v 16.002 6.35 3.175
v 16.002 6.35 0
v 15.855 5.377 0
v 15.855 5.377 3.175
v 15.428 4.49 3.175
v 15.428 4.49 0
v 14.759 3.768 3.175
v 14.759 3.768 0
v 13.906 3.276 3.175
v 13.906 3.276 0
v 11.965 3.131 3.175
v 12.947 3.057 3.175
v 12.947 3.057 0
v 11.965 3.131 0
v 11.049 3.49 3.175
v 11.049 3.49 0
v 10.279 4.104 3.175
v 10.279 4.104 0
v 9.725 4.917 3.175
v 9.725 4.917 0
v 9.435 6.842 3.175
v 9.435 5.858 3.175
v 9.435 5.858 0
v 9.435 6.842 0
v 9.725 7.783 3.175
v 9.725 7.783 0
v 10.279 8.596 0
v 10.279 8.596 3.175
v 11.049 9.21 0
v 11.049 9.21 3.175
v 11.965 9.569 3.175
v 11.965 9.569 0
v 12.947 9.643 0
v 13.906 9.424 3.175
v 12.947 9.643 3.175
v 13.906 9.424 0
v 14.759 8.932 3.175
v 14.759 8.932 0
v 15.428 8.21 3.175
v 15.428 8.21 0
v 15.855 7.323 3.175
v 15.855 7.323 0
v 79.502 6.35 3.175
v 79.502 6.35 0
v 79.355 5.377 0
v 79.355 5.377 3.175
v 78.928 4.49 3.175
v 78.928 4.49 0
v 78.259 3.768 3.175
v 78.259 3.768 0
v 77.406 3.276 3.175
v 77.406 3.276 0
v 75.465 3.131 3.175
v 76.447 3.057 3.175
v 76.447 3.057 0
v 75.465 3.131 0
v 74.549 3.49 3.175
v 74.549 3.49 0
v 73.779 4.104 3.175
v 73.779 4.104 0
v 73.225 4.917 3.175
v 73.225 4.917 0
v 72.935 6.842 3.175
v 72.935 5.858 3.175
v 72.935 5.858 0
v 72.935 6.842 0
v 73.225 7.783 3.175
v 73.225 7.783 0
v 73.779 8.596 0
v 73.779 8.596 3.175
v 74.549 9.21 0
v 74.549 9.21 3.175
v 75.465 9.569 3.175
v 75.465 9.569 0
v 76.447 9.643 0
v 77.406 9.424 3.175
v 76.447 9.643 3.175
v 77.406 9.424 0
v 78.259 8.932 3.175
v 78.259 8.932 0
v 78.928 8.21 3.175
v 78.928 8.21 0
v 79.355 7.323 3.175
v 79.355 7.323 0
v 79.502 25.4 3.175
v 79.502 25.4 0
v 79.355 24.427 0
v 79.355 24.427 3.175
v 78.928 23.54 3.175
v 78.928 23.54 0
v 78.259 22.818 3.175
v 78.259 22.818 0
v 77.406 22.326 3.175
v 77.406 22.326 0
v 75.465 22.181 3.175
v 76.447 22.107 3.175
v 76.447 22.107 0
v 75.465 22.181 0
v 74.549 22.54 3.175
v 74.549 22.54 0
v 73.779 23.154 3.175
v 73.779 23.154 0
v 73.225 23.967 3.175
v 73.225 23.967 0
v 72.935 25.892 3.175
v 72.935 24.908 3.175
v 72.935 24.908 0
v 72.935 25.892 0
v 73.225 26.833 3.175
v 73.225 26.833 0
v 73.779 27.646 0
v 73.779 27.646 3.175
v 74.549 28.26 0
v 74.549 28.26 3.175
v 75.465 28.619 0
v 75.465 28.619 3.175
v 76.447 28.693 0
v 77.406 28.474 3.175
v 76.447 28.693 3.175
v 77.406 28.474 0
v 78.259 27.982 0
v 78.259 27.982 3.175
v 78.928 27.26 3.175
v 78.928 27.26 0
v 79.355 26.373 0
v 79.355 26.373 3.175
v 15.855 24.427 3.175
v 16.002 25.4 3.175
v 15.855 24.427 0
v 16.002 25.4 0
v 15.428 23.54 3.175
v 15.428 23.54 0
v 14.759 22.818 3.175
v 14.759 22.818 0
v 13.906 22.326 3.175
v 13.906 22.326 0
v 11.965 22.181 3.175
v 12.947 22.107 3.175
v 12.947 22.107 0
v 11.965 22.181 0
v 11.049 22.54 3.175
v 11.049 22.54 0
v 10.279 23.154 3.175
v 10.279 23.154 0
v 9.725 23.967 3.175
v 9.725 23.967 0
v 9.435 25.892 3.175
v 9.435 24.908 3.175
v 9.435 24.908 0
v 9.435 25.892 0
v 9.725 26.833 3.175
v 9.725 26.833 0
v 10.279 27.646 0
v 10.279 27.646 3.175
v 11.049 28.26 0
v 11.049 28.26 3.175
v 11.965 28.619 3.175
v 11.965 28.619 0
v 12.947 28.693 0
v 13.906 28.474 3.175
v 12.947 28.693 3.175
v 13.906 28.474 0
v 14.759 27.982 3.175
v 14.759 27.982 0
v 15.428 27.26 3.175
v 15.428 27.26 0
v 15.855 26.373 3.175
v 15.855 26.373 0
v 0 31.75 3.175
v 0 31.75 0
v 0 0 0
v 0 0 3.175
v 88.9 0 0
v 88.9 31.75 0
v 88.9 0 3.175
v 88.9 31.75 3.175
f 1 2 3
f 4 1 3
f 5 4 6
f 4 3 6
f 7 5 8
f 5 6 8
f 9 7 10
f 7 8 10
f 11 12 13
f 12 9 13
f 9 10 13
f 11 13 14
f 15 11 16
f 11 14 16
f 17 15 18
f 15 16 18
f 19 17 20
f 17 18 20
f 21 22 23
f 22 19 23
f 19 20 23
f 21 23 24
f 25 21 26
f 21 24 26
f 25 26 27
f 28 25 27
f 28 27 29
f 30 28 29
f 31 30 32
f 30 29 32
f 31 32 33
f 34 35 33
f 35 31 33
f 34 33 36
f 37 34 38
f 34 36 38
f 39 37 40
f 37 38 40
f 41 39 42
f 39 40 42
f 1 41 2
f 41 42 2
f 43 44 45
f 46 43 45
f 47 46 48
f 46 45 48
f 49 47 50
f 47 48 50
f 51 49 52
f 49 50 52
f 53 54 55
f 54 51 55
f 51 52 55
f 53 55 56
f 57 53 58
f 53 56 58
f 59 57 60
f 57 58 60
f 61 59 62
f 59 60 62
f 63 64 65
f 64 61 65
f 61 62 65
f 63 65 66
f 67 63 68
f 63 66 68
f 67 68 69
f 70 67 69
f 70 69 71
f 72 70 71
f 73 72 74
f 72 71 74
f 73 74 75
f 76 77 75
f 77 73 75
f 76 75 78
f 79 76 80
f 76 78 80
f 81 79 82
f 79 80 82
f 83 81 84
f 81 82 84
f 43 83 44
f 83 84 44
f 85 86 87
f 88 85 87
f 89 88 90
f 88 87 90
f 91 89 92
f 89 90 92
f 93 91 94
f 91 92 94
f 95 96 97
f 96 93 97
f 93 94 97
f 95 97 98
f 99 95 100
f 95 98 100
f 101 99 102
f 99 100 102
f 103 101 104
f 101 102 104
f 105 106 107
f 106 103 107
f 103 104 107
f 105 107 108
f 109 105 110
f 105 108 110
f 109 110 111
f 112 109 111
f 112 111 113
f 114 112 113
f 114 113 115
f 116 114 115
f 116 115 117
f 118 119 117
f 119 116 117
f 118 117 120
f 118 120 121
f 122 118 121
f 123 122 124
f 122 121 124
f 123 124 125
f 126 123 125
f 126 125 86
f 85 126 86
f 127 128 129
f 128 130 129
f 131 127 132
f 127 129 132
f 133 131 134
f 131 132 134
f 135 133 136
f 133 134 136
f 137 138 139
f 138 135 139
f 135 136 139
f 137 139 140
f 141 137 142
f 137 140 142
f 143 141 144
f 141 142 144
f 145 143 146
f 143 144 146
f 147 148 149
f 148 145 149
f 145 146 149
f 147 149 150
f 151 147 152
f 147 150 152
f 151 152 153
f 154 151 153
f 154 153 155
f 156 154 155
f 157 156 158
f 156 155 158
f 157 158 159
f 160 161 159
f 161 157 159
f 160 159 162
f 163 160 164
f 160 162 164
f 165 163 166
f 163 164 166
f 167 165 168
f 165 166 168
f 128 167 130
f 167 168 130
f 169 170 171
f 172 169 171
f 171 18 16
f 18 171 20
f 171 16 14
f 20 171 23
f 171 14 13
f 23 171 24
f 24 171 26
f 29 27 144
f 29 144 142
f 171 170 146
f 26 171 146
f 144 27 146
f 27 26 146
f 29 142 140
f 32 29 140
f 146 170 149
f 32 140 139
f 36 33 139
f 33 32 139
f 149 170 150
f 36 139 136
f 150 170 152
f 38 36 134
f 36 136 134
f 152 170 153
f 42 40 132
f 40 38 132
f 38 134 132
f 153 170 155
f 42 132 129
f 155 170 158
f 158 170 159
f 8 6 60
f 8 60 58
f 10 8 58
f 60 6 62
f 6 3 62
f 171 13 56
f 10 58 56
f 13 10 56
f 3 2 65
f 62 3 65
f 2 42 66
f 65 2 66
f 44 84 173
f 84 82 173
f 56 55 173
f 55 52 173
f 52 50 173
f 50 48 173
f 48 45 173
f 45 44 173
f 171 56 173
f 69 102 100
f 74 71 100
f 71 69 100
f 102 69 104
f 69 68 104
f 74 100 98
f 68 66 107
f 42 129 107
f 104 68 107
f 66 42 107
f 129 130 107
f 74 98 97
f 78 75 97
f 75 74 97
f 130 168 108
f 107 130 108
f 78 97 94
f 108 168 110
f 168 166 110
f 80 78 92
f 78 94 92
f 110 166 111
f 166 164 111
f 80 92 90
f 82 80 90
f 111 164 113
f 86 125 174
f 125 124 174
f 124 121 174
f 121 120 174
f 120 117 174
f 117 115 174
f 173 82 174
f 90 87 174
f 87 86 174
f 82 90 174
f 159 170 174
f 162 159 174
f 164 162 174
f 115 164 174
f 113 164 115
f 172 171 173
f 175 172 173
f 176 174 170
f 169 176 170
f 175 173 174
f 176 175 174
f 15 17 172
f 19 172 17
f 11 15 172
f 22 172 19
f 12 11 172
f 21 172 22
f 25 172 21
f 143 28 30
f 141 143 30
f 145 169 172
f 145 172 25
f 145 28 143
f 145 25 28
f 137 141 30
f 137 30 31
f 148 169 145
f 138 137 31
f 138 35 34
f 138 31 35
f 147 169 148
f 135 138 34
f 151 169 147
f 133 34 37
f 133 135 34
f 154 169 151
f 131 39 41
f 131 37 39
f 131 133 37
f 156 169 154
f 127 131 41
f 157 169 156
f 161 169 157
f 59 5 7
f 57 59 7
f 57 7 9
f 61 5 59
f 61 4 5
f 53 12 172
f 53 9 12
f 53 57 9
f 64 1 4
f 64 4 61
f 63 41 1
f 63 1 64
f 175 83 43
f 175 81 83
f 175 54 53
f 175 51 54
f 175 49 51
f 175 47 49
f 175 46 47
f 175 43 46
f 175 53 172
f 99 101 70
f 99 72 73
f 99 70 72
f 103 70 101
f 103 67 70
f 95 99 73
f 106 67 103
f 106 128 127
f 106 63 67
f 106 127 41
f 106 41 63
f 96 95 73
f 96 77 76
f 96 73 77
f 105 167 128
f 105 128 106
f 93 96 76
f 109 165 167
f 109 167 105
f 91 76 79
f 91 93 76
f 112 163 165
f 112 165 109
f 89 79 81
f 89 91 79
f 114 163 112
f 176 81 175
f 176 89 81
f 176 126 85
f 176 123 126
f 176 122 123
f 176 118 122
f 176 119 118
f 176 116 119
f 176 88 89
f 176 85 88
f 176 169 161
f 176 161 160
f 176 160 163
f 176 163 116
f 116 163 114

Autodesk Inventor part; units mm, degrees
ref_plane "YZ Plane" through (0, 0, 0) normal (1, 0, 0) x (0, 1, 0)
ref_plane "XZ Plane" through (0, 0, 0) normal (0, 1, 0) x (-1, 0, 0)
ref_plane "XY Plane" through (0, 0, 0) normal (0, 0, 1) x (1, 0, 0)
sketch "Sketch1" plane through (0, 0, 0) normal (0, 0, 1) x (1, 0, 0)
  line L0 (0, 0) -> (88.9, 0)
  line L1 (88.9, 0) -> (88.9, 31.75)
  line L2 (88.9, 31.75) -> (0, 31.75)
  line L3 (0, 31.75) -> (0, 0)
  circle A0 centre (12.7, 25.4) radius 3.302
  circle A1 centre (76.2, 25.4) radius 3.302
  circle A2 centre (12.7, 6.35) radius 3.302
  circle A3 centre (76.2, 6.35) radius 3.302
  line L4 (12.7, 25.4) -> (76.2, 25.4) construction
  line L5 (44.45, 31.75) -> (44.45, 0) construction
  point P0 (44.45, 25.4)
  dimension "d0" = 88.9
  dimension "d2" = 31.75
  dimension "d5" = 63.5
  dimension "d8" = 19.05
  dimension "d11" = 6.35
  dimension "d12" = 6.604
extrude "Extrusion1" add sketch "Sketch1" along normal blind 3.175
properties part number "M - Upper Rail Connector Plate 1" material "Aluminum 6061"
